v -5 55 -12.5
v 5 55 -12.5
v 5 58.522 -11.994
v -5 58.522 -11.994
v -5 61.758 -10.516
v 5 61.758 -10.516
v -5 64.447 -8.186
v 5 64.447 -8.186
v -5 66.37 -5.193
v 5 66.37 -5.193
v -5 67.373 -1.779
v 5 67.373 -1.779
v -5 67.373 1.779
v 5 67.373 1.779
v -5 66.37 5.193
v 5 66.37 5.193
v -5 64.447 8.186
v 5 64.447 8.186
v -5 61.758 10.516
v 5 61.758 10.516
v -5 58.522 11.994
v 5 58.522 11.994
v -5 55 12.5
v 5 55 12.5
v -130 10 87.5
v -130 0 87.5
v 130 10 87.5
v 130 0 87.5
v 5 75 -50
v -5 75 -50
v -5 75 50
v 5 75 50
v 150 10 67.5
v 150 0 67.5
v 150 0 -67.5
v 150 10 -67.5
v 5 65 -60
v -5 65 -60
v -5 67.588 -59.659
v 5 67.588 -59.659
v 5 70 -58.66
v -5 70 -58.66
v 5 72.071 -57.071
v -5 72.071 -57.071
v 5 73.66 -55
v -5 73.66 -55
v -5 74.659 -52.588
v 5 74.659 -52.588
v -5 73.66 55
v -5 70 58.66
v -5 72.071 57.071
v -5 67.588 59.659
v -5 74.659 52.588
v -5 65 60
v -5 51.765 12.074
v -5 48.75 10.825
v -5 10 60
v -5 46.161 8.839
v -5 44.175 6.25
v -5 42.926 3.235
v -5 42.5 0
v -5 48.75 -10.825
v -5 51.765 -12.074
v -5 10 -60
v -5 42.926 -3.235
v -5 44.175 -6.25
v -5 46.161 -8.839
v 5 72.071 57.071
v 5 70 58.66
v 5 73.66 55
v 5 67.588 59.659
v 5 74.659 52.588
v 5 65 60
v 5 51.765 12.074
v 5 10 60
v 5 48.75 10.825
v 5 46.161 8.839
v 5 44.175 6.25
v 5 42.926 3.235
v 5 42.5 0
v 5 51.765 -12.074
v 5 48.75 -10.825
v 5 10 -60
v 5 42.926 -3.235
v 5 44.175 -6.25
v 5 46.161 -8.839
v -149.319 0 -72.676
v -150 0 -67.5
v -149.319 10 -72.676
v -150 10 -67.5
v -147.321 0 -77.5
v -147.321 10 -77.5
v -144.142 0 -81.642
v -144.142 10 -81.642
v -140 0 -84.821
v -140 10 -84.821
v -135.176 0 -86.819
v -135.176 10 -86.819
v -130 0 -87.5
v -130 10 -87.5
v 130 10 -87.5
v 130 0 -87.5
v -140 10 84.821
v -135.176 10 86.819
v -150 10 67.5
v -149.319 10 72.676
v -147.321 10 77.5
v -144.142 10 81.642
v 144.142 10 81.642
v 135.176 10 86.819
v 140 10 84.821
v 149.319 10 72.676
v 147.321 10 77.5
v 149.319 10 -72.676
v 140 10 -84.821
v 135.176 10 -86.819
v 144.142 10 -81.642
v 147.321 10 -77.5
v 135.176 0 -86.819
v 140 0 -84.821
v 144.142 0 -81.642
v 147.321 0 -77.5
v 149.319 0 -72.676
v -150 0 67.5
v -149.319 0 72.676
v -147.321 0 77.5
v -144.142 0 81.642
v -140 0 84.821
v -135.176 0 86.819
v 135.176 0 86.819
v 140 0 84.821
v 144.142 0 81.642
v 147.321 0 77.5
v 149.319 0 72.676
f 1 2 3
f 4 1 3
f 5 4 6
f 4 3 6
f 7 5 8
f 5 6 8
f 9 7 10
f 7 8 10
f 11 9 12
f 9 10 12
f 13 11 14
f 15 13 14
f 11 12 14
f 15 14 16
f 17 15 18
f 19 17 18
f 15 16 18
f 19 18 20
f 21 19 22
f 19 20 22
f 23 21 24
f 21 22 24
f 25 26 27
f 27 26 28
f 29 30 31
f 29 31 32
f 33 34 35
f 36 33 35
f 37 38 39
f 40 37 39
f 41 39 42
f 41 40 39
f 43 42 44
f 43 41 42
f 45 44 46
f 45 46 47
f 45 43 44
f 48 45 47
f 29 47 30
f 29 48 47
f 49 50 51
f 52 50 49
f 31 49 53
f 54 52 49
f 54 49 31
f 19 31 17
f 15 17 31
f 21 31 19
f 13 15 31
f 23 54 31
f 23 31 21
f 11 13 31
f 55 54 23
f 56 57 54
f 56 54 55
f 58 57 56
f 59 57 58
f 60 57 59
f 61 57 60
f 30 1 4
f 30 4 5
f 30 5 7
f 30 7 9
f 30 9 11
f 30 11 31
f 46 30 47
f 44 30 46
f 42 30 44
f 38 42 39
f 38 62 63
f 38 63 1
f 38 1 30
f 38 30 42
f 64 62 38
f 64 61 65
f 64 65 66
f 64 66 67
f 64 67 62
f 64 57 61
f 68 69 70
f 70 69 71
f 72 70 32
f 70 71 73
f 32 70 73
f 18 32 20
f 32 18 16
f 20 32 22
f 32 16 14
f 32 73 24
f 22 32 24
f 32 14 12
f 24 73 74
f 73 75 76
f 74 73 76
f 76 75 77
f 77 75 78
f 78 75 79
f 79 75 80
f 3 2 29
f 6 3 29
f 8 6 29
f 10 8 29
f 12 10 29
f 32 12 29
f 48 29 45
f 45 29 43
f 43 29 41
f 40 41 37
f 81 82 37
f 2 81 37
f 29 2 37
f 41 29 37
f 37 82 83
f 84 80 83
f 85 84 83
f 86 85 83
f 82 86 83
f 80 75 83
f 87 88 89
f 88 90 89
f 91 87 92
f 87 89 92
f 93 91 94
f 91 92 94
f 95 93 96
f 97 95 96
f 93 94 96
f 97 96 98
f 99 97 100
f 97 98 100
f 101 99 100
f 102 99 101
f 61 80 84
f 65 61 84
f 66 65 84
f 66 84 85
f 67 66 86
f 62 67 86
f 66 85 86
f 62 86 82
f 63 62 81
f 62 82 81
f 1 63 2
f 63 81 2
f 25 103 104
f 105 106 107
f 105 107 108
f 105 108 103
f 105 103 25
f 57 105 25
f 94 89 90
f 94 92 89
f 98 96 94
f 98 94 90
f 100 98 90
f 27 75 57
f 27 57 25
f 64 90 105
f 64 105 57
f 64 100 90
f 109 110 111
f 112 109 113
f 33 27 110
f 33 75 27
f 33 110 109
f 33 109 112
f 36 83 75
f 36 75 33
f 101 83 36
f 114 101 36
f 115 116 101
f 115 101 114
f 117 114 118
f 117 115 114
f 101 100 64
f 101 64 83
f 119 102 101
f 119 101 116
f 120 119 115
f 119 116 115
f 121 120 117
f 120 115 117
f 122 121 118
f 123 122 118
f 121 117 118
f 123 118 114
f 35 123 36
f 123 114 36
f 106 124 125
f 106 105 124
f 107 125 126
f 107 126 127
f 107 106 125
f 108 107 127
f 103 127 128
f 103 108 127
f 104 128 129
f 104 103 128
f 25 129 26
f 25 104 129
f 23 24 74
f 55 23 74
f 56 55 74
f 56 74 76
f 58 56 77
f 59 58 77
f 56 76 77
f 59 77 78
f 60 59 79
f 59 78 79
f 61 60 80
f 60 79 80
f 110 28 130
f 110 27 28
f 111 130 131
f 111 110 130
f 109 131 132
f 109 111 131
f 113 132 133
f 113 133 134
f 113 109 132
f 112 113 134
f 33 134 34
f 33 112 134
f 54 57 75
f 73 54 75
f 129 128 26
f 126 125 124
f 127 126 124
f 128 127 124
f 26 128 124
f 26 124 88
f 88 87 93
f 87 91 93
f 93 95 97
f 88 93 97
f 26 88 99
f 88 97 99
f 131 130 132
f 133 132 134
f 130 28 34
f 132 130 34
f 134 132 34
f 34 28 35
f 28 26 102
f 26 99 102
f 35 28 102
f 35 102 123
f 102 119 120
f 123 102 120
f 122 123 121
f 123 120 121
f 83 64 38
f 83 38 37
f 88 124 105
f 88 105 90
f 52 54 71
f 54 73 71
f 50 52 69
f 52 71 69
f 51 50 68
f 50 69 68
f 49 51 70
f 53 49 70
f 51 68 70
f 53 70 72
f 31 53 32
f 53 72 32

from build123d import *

# Parameters (mm, degrees)
SKETCH1_W           = 300
SKETCH1_H           = 175
BOSS_EXTRUDE1_DEPTH = 10
SKETCH2_W           = 10
SKETCH2_H           = 120
BOSS_EXTRUDE2_DEPTH = 65
CUT_EXTRUDE1_DEPTH  = 10
FILLET1_R           = 10
FILLET2_R           = 20


with BuildPart() as part:
    # Sketch1 → Boss-Extrude1 (new body)
    with BuildSketch(Plane(origin=(0, 0, 0), x_dir=(1, 0, 0), z_dir=(0, 1, 0))):
        Rectangle(SKETCH1_W, SKETCH1_H)
    extrude(amount=BOSS_EXTRUDE1_DEPTH)

    # Sketch2 → Boss-Extrude2 (add)
    with BuildSketch(Plane(origin=(0, 10, 0), x_dir=(1, 0, 0), z_dir=(0, 1, 0))):
        Rectangle(SKETCH2_W, SKETCH2_H)
    extrude(amount=BOSS_EXTRUDE2_DEPTH)

    # Sketch3 → Cut-Extrude1 (cut)
    with BuildSketch(Plane(origin=(5, 0, 0), x_dir=(0, 0, -1), z_dir=(1, 0, 0))):
        with BuildLine():
            ThreePointArc((-12.5, 55), (-8.838834765, 46.161165235), (0, 42.5))
            Line((0, 42.5), (0, 55))
            Line((0, 55), (-12.5, 55))
        make_face()
        with BuildLine():
            Line((0, 55), (0, 42.5))
            ThreePointArc((0, 42.5), (8.838834765, 46.161165235), (12.5, 55))
            Line((12.5, 55), (0, 55))
        make_face()
        with BuildLine():
            Line((-12.5, 55), (0, 55))
            Line((0, 55), (12.5, 55))
            ThreePointArc((12.5, 55), (0, 67.5), (-12.5, 55))
        make_face()
    extrude(amount=-CUT_EXTRUDE1_DEPTH, mode=Mode.SUBTRACT)

    # Fillet1
    fillet1_edges = [part.edges().sort_by_distance(p)[0] for p in [
        (0, 75, -60),
        (0, 75, 60),
    ]]
    fillet(fillet1_edges, radius=FILLET1_R)

    # Fillet2
    fillet2_edges = [part.edges().sort_by_distance(p)[0] for p in [
        (150, 5, 87.5),
        (-150, 5, 87.5),
        (-150, 5, -87.5),
        (150, 5, -87.5),
    ]]
    fillet(fillet2_edges, radius=FILLET2_R)


solid = part.part
